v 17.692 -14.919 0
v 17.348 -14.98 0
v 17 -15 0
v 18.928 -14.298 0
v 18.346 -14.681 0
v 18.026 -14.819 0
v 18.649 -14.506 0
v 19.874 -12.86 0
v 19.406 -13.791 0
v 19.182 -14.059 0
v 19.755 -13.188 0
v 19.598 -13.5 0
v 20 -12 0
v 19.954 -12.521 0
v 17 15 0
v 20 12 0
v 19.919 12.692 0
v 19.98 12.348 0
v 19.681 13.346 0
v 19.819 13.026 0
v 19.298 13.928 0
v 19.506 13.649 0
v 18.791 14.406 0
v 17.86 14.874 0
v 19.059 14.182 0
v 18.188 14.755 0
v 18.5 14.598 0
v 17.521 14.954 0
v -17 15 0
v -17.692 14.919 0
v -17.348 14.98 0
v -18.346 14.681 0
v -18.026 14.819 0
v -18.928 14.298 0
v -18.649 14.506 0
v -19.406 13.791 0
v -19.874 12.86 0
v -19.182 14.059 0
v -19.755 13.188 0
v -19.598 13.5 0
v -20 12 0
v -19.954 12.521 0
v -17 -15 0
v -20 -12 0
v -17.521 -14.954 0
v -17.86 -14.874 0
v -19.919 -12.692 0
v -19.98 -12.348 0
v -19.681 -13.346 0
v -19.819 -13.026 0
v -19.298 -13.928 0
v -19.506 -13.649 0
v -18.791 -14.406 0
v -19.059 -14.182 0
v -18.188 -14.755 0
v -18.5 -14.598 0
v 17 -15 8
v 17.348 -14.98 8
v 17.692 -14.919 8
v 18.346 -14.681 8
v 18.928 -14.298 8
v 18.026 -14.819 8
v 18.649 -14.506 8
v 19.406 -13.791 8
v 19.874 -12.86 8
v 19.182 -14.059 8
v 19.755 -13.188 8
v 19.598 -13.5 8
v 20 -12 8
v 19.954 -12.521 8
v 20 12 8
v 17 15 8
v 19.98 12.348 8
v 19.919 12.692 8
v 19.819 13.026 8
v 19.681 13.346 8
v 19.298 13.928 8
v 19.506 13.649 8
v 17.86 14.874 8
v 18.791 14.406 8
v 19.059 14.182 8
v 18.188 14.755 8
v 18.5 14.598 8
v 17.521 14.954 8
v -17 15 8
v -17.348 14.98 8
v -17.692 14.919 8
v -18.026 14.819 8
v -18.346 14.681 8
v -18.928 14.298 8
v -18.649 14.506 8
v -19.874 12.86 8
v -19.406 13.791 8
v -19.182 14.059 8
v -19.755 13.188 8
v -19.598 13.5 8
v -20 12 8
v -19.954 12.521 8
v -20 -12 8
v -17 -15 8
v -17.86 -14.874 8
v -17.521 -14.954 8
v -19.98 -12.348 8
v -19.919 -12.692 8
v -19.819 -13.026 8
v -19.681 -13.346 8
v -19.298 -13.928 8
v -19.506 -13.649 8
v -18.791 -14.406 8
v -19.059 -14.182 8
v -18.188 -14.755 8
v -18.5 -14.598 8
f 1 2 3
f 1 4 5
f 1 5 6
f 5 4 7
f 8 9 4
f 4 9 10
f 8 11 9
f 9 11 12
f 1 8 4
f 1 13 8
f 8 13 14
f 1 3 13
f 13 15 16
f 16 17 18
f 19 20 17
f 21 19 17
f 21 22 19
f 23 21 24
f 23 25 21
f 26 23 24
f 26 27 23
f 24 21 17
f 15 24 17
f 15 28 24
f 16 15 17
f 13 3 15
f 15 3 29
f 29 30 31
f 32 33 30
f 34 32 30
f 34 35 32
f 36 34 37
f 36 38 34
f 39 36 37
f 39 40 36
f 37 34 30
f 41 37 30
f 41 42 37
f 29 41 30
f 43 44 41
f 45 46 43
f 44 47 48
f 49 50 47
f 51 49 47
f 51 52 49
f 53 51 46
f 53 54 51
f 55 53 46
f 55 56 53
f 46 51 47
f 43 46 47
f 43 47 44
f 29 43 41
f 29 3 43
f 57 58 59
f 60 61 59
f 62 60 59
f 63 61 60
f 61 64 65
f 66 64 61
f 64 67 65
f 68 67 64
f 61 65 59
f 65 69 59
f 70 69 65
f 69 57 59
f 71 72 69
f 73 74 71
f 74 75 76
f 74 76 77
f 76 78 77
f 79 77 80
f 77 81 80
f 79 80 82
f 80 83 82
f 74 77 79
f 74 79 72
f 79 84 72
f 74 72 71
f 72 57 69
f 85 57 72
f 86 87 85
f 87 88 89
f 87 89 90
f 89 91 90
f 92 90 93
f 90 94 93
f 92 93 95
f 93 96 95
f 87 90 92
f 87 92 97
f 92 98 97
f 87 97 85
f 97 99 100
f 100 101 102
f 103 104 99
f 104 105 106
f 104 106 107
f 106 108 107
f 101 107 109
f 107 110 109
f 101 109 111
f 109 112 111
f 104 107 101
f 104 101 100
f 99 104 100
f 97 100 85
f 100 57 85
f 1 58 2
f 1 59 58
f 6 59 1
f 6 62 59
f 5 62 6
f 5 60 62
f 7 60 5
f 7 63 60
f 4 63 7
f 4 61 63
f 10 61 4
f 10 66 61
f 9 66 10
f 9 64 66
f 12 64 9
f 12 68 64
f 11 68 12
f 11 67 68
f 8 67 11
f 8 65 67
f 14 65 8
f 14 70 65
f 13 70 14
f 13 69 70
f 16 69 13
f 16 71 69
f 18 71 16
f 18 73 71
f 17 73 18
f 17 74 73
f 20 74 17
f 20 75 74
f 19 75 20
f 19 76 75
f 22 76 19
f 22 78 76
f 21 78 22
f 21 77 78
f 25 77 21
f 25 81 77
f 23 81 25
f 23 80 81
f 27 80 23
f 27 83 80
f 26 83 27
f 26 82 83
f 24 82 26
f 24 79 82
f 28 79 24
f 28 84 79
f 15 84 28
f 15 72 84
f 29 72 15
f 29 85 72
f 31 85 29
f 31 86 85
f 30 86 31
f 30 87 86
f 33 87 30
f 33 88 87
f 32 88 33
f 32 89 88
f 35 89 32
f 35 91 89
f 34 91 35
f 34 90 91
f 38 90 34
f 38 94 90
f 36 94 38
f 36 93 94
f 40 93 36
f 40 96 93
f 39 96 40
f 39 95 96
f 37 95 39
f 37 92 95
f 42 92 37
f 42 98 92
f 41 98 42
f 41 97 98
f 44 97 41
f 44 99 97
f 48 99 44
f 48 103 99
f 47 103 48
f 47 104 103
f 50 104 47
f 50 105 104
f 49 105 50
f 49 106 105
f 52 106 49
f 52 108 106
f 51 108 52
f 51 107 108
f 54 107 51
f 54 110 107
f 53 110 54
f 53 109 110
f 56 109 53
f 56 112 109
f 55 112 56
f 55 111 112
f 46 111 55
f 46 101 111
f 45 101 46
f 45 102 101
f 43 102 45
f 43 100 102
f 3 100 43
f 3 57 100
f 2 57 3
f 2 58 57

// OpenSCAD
// Replace this sample with the requested model. All dimensions are millimeters.
// Base at Z=0; export the printable geometry, not an exploded assembly.
width = 40;
depth = 30;
height = 8;
corner_radius = 3;
$fa = $preview ? 8 : 3;
$fs = $preview ? 1 : 0.35;
assert(corner_radius >= 0 && width > 2*corner_radius && depth > 2*corner_radius && height > 0);

module model() {
    // Round the XY outline only, preserving a flat, support-free bottom.
    linear_extrude(height)
        offset(r=corner_radius)
            square([width-2*corner_radius, depth-2*corner_radius], center=true);
}
model();
